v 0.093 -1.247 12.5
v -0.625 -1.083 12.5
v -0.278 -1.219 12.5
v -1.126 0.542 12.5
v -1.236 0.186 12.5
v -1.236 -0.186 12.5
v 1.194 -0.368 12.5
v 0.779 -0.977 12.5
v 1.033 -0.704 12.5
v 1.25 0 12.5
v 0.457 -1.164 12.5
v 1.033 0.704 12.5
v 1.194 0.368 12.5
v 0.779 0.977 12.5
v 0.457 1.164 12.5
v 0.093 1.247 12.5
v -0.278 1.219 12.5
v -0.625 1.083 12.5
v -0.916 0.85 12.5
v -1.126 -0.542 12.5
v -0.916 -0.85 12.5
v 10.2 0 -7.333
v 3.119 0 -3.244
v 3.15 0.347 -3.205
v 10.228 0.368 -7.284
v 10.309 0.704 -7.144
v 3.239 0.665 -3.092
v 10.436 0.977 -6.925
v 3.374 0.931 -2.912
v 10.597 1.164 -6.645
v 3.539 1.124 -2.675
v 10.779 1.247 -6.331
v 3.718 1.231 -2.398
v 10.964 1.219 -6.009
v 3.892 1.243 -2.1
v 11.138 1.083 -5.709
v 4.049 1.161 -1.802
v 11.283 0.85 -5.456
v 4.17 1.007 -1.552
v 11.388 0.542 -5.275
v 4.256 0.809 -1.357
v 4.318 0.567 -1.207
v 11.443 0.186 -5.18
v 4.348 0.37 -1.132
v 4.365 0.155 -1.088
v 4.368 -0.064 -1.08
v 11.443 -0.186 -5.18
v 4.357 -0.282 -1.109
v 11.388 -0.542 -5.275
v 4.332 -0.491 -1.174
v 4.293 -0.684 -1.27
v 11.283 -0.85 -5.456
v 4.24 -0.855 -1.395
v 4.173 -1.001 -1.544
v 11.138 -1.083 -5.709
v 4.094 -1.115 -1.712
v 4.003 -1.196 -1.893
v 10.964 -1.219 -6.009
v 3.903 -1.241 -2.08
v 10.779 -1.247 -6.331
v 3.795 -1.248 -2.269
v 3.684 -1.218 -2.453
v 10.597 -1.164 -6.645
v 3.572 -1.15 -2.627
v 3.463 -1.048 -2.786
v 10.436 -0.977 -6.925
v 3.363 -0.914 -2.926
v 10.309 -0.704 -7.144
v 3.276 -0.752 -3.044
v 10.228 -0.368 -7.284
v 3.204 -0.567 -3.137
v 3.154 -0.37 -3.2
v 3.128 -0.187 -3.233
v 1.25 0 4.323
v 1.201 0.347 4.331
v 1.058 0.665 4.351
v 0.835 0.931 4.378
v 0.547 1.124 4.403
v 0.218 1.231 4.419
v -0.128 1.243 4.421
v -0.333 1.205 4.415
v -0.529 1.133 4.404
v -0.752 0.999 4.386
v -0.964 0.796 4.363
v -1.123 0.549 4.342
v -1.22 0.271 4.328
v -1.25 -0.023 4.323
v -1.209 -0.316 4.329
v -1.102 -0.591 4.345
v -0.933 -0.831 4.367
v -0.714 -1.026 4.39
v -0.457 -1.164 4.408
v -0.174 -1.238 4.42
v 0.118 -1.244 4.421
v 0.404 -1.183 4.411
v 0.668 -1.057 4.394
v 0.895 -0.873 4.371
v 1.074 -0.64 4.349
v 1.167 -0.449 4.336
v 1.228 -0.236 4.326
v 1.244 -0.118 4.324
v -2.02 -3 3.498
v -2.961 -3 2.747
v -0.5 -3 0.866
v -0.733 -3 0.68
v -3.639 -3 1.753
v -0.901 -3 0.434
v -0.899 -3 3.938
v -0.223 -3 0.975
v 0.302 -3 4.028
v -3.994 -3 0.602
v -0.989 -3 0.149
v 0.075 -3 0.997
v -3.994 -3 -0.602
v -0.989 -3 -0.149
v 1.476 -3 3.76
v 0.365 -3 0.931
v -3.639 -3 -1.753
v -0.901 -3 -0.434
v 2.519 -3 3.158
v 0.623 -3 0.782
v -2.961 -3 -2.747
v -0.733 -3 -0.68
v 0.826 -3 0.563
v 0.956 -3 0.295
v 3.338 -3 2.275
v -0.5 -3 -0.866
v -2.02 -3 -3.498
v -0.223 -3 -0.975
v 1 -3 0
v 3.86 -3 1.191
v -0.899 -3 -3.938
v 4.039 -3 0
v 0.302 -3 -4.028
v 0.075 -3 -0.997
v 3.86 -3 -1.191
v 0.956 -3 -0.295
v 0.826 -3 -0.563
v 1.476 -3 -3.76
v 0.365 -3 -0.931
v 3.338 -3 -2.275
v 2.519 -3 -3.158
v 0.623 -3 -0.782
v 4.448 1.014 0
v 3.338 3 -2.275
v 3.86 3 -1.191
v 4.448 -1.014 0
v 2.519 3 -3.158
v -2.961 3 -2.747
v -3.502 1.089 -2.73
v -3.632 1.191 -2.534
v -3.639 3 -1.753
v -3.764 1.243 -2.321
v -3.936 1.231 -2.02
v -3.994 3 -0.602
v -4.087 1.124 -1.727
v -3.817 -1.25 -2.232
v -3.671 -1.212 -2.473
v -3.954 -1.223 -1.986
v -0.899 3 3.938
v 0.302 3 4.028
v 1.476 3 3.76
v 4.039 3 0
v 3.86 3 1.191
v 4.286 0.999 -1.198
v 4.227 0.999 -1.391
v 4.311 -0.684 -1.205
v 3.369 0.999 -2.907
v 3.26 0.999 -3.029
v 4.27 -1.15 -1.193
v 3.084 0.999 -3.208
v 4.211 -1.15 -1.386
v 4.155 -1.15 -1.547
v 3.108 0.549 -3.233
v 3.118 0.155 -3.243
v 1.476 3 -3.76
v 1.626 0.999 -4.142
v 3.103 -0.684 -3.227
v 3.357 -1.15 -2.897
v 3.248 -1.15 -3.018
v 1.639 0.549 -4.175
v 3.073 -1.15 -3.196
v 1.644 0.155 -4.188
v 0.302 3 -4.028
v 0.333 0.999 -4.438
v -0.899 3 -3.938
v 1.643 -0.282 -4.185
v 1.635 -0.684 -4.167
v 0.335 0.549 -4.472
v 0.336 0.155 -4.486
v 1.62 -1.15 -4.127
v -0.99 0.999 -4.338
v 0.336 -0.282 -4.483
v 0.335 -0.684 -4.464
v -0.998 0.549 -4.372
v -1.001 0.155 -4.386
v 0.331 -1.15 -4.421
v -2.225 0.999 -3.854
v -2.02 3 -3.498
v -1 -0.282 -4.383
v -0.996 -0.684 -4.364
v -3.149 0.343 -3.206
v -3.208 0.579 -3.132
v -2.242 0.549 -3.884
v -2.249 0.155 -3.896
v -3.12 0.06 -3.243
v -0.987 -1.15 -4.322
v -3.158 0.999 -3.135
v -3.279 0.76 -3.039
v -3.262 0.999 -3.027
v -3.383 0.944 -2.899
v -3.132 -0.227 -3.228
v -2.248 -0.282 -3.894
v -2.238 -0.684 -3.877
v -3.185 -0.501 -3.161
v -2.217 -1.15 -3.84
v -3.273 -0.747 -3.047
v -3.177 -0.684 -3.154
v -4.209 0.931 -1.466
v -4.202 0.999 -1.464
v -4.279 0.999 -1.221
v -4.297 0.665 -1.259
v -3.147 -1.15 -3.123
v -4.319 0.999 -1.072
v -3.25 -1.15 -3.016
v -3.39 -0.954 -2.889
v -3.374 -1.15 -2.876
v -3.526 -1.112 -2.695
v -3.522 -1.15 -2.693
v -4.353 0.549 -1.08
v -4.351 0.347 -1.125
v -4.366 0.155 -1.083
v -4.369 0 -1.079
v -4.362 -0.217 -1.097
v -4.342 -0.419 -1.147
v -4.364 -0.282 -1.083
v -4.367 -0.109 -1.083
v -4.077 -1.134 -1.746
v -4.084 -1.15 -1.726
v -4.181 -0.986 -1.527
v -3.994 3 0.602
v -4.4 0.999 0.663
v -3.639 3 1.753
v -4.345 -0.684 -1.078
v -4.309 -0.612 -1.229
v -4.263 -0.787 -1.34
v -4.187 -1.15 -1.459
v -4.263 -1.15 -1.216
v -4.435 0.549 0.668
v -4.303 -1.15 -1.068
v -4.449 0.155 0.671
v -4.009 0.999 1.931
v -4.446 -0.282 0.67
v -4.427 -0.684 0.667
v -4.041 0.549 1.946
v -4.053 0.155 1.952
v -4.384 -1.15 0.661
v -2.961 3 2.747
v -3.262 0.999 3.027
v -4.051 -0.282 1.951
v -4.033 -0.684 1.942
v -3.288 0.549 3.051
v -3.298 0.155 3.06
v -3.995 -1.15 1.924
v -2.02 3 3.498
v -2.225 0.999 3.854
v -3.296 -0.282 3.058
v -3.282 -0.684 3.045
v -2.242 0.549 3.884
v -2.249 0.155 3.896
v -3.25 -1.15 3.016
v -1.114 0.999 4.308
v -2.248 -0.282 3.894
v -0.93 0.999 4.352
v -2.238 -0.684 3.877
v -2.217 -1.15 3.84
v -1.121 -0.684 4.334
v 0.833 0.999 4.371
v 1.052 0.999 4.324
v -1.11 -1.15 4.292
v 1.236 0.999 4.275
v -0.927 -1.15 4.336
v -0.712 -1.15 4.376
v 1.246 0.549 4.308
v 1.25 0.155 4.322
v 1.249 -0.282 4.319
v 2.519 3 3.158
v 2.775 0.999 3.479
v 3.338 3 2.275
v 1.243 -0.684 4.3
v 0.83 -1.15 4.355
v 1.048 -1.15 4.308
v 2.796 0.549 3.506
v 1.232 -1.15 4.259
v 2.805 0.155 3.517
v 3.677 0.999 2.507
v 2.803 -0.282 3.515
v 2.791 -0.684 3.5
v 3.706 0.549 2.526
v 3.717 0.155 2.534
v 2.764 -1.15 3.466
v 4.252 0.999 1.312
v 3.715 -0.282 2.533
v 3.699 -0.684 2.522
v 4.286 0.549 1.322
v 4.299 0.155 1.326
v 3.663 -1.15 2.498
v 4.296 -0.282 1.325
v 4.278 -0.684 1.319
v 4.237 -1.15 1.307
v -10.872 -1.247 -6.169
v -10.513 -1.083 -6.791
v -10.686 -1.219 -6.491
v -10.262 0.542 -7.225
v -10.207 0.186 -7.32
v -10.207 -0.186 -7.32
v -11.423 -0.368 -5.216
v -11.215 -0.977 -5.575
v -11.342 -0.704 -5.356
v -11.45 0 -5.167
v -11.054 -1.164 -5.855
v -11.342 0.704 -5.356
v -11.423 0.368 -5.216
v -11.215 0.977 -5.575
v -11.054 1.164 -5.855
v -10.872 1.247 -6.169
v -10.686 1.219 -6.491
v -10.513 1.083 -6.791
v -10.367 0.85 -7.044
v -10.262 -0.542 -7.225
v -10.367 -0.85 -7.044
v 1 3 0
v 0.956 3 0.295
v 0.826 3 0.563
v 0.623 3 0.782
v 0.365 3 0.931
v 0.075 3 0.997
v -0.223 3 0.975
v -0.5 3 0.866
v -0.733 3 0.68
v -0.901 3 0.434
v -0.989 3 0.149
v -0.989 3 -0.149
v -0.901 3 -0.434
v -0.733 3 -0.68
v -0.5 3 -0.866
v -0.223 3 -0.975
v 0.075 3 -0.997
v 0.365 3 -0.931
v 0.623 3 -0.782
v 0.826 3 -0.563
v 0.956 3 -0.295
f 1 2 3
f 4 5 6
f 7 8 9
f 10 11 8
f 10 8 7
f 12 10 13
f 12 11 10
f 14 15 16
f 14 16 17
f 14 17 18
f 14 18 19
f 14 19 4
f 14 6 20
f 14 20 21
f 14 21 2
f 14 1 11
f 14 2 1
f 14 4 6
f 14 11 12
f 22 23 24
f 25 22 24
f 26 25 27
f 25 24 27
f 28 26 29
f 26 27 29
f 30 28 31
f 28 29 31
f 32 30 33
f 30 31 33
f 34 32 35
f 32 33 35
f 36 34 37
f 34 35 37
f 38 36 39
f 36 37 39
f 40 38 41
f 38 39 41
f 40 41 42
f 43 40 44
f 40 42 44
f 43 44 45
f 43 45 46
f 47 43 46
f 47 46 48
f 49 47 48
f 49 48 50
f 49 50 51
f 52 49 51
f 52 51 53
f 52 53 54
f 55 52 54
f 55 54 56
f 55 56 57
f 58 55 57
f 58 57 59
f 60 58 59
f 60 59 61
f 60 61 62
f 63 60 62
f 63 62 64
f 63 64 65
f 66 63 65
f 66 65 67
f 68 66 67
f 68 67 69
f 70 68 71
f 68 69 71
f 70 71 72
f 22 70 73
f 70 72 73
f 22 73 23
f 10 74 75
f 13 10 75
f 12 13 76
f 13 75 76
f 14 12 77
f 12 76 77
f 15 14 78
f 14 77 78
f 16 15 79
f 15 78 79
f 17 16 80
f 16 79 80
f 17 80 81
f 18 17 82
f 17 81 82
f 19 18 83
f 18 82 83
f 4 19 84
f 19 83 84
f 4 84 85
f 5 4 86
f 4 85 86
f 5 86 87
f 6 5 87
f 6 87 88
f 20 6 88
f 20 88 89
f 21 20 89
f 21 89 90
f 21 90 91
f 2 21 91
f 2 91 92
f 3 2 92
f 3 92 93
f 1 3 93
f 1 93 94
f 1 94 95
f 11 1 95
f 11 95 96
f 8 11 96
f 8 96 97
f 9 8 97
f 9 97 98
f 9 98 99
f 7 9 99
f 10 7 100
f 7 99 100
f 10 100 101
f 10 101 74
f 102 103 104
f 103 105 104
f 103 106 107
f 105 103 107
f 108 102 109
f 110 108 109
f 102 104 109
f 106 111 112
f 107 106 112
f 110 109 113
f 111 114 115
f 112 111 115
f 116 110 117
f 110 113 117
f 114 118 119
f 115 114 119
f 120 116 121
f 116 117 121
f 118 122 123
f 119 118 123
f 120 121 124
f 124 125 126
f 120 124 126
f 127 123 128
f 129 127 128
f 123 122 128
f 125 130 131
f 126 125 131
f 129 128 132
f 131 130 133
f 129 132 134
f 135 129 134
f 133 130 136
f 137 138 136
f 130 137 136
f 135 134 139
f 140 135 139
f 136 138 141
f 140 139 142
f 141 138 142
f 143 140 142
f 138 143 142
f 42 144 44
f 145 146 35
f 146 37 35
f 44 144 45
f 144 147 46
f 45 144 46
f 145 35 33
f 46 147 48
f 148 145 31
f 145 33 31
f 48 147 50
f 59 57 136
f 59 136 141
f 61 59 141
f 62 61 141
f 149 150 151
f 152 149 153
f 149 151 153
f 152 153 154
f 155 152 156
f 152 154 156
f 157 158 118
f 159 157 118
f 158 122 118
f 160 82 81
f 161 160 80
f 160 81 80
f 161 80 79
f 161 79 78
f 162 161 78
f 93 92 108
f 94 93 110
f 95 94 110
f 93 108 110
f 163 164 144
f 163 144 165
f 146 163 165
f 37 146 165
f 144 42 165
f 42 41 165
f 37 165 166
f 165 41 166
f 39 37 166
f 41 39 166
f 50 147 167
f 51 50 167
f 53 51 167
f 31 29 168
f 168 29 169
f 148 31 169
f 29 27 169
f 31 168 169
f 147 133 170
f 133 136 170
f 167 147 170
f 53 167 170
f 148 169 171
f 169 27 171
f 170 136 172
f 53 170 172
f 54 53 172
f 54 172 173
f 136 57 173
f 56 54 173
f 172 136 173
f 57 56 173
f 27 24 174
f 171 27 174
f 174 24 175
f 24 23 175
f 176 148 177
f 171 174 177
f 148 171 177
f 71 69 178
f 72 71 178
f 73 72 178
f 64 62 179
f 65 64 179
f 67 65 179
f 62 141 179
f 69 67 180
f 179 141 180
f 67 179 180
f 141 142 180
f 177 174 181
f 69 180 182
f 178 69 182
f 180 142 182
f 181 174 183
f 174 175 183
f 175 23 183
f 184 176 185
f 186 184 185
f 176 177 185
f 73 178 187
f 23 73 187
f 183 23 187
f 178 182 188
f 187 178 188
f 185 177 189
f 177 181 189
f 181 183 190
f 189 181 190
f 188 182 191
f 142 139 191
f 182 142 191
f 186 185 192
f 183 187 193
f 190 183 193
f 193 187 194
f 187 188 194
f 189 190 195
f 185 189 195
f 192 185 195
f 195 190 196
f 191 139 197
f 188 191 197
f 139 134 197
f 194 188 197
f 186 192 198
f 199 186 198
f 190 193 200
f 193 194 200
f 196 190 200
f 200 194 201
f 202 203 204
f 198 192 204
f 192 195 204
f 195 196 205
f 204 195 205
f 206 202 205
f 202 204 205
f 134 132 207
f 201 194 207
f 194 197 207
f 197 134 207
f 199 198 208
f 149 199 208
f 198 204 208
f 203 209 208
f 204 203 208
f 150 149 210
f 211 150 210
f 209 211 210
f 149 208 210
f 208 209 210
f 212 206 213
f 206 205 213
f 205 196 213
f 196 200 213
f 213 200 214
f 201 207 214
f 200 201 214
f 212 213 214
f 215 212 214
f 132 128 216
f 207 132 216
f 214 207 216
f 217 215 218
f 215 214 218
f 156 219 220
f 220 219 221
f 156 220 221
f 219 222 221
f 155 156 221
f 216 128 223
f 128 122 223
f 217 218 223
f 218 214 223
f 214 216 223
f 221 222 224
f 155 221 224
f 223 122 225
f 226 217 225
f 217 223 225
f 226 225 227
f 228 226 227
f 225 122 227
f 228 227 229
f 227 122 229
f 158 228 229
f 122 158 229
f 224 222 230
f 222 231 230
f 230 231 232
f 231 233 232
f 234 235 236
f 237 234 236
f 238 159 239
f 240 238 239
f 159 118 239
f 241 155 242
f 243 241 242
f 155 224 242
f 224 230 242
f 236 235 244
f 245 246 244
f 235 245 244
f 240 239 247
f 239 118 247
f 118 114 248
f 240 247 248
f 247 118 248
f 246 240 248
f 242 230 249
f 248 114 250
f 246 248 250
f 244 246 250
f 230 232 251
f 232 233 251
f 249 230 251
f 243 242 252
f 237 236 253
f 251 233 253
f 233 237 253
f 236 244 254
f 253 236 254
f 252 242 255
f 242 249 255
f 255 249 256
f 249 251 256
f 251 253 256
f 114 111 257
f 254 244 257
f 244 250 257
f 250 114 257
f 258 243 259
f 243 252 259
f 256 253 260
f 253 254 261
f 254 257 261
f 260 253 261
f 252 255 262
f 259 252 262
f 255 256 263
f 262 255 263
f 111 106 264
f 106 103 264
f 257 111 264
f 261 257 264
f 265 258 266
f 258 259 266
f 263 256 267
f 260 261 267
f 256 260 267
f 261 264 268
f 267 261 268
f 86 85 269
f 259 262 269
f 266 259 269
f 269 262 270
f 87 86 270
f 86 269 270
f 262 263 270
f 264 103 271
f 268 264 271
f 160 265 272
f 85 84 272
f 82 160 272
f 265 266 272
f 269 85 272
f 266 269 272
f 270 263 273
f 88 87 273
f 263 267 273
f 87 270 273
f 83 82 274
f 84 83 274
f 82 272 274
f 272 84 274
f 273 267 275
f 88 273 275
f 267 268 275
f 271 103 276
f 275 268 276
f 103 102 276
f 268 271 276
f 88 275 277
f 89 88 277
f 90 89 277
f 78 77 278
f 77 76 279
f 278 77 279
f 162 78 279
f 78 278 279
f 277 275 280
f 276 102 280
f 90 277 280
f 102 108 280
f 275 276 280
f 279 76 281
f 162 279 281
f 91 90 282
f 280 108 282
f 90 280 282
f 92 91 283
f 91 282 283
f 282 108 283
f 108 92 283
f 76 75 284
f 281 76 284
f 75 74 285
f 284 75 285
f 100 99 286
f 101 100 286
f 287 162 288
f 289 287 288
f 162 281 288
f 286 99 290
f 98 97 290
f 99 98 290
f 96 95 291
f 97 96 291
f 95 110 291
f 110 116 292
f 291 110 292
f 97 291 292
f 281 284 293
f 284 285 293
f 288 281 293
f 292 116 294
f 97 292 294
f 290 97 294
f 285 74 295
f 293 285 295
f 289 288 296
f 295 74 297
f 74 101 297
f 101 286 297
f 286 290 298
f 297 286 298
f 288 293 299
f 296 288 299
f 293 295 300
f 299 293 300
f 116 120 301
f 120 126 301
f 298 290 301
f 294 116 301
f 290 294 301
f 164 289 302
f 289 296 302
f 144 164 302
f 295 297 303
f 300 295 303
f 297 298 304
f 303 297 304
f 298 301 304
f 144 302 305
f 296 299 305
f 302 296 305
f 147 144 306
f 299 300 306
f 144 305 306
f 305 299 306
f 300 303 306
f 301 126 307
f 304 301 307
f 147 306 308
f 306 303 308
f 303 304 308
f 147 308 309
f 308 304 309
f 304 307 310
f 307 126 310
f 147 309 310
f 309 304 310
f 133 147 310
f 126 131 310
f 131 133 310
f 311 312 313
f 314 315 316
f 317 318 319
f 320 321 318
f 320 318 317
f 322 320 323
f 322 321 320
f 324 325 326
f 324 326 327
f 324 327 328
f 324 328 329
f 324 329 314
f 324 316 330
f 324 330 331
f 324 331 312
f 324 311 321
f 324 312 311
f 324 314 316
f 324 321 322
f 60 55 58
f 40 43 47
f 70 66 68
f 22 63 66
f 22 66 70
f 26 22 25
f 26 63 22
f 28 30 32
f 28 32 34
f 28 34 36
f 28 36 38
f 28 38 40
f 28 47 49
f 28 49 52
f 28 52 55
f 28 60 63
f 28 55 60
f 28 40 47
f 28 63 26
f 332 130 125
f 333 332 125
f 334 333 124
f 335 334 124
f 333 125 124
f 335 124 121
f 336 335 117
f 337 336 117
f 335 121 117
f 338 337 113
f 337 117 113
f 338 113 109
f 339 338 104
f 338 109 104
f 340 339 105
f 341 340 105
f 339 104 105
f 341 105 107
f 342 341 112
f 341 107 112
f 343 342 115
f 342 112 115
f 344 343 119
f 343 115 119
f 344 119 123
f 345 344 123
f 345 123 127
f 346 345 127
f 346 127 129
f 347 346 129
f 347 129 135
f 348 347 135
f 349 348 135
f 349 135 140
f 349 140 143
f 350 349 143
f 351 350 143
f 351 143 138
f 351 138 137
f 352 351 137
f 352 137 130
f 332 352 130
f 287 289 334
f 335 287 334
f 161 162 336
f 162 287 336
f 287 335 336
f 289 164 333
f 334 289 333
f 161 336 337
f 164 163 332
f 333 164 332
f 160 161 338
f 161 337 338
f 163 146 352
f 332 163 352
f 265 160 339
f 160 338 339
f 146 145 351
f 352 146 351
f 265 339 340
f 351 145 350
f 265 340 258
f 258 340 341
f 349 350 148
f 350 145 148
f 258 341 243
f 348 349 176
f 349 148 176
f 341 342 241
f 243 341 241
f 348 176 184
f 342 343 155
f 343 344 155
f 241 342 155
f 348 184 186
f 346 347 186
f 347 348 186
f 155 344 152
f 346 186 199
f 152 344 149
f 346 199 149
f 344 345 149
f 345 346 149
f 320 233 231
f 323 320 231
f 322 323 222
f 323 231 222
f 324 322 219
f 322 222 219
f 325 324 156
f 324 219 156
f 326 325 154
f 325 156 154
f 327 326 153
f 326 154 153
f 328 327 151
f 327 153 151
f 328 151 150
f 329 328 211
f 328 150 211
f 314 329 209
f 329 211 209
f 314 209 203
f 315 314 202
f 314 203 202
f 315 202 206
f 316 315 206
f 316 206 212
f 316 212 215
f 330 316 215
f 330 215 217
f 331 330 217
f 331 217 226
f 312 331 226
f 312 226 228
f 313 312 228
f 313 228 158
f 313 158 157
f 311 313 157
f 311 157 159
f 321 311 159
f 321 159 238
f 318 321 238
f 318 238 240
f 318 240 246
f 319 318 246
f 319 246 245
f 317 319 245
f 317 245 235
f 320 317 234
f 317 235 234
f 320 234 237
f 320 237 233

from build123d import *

# Parameters (mm, degrees)
ESQUISSE3_R                  = 1.25
BOSS_EXTRU_1_DEPTH           = 12.5
R_P_TITION_CIRCULAIRE1_COUNT = 3
ESQUISSE2_R                  = 1
ENL_V_MAT_EXTRU_2_DEPTH      = 7.0000001


with BuildPart() as part:
    # Esquisse1 → Base-Révolution (revolve)
    with BuildSketch(Plane.XY):
        with BuildLine():
            Line((0, 3), (4.039392014, 3))
            ThreePointArc((4.039392014, 3), (4.5, 0), (4.039392014, -3))
            Line((4.039392014, -3), (0, -3))
            Line((0, -3), (0, 3))
        make_face()
    revolve(axis=Axis((0, -3, 0), (0, 1, 0)))

    # Esquisse3 → Boss.-Extru.1 (add)
    with BuildSketch(Plane.XY):
        Circle(ESQUISSE3_R)
    boss_extru_1 = extrude(amount=BOSS_EXTRU_1_DEPTH)

    # Répétition circulaire1: Boss.-Extru.1 ×3 about axis
    r_p_tition_circulaire1_axis = Axis((0, -3, 0), (0, 1, 0))
    for i in range(1, R_P_TITION_CIRCULAIRE1_COUNT):
        add(boss_extru_1.rotate(r_p_tition_circulaire1_axis, i * 360 / R_P_TITION_CIRCULAIRE1_COUNT))

    # Esquisse2 → Enlèv. mat.-Extru.2 (cut, through all)
    with BuildSketch(Plane.XZ.offset(3)):
        Circle(ESQUISSE2_R)
    extrude(amount=-ENL_V_MAT_EXTRU_2_DEPTH, mode=Mode.SUBTRACT)


solid = part.part
